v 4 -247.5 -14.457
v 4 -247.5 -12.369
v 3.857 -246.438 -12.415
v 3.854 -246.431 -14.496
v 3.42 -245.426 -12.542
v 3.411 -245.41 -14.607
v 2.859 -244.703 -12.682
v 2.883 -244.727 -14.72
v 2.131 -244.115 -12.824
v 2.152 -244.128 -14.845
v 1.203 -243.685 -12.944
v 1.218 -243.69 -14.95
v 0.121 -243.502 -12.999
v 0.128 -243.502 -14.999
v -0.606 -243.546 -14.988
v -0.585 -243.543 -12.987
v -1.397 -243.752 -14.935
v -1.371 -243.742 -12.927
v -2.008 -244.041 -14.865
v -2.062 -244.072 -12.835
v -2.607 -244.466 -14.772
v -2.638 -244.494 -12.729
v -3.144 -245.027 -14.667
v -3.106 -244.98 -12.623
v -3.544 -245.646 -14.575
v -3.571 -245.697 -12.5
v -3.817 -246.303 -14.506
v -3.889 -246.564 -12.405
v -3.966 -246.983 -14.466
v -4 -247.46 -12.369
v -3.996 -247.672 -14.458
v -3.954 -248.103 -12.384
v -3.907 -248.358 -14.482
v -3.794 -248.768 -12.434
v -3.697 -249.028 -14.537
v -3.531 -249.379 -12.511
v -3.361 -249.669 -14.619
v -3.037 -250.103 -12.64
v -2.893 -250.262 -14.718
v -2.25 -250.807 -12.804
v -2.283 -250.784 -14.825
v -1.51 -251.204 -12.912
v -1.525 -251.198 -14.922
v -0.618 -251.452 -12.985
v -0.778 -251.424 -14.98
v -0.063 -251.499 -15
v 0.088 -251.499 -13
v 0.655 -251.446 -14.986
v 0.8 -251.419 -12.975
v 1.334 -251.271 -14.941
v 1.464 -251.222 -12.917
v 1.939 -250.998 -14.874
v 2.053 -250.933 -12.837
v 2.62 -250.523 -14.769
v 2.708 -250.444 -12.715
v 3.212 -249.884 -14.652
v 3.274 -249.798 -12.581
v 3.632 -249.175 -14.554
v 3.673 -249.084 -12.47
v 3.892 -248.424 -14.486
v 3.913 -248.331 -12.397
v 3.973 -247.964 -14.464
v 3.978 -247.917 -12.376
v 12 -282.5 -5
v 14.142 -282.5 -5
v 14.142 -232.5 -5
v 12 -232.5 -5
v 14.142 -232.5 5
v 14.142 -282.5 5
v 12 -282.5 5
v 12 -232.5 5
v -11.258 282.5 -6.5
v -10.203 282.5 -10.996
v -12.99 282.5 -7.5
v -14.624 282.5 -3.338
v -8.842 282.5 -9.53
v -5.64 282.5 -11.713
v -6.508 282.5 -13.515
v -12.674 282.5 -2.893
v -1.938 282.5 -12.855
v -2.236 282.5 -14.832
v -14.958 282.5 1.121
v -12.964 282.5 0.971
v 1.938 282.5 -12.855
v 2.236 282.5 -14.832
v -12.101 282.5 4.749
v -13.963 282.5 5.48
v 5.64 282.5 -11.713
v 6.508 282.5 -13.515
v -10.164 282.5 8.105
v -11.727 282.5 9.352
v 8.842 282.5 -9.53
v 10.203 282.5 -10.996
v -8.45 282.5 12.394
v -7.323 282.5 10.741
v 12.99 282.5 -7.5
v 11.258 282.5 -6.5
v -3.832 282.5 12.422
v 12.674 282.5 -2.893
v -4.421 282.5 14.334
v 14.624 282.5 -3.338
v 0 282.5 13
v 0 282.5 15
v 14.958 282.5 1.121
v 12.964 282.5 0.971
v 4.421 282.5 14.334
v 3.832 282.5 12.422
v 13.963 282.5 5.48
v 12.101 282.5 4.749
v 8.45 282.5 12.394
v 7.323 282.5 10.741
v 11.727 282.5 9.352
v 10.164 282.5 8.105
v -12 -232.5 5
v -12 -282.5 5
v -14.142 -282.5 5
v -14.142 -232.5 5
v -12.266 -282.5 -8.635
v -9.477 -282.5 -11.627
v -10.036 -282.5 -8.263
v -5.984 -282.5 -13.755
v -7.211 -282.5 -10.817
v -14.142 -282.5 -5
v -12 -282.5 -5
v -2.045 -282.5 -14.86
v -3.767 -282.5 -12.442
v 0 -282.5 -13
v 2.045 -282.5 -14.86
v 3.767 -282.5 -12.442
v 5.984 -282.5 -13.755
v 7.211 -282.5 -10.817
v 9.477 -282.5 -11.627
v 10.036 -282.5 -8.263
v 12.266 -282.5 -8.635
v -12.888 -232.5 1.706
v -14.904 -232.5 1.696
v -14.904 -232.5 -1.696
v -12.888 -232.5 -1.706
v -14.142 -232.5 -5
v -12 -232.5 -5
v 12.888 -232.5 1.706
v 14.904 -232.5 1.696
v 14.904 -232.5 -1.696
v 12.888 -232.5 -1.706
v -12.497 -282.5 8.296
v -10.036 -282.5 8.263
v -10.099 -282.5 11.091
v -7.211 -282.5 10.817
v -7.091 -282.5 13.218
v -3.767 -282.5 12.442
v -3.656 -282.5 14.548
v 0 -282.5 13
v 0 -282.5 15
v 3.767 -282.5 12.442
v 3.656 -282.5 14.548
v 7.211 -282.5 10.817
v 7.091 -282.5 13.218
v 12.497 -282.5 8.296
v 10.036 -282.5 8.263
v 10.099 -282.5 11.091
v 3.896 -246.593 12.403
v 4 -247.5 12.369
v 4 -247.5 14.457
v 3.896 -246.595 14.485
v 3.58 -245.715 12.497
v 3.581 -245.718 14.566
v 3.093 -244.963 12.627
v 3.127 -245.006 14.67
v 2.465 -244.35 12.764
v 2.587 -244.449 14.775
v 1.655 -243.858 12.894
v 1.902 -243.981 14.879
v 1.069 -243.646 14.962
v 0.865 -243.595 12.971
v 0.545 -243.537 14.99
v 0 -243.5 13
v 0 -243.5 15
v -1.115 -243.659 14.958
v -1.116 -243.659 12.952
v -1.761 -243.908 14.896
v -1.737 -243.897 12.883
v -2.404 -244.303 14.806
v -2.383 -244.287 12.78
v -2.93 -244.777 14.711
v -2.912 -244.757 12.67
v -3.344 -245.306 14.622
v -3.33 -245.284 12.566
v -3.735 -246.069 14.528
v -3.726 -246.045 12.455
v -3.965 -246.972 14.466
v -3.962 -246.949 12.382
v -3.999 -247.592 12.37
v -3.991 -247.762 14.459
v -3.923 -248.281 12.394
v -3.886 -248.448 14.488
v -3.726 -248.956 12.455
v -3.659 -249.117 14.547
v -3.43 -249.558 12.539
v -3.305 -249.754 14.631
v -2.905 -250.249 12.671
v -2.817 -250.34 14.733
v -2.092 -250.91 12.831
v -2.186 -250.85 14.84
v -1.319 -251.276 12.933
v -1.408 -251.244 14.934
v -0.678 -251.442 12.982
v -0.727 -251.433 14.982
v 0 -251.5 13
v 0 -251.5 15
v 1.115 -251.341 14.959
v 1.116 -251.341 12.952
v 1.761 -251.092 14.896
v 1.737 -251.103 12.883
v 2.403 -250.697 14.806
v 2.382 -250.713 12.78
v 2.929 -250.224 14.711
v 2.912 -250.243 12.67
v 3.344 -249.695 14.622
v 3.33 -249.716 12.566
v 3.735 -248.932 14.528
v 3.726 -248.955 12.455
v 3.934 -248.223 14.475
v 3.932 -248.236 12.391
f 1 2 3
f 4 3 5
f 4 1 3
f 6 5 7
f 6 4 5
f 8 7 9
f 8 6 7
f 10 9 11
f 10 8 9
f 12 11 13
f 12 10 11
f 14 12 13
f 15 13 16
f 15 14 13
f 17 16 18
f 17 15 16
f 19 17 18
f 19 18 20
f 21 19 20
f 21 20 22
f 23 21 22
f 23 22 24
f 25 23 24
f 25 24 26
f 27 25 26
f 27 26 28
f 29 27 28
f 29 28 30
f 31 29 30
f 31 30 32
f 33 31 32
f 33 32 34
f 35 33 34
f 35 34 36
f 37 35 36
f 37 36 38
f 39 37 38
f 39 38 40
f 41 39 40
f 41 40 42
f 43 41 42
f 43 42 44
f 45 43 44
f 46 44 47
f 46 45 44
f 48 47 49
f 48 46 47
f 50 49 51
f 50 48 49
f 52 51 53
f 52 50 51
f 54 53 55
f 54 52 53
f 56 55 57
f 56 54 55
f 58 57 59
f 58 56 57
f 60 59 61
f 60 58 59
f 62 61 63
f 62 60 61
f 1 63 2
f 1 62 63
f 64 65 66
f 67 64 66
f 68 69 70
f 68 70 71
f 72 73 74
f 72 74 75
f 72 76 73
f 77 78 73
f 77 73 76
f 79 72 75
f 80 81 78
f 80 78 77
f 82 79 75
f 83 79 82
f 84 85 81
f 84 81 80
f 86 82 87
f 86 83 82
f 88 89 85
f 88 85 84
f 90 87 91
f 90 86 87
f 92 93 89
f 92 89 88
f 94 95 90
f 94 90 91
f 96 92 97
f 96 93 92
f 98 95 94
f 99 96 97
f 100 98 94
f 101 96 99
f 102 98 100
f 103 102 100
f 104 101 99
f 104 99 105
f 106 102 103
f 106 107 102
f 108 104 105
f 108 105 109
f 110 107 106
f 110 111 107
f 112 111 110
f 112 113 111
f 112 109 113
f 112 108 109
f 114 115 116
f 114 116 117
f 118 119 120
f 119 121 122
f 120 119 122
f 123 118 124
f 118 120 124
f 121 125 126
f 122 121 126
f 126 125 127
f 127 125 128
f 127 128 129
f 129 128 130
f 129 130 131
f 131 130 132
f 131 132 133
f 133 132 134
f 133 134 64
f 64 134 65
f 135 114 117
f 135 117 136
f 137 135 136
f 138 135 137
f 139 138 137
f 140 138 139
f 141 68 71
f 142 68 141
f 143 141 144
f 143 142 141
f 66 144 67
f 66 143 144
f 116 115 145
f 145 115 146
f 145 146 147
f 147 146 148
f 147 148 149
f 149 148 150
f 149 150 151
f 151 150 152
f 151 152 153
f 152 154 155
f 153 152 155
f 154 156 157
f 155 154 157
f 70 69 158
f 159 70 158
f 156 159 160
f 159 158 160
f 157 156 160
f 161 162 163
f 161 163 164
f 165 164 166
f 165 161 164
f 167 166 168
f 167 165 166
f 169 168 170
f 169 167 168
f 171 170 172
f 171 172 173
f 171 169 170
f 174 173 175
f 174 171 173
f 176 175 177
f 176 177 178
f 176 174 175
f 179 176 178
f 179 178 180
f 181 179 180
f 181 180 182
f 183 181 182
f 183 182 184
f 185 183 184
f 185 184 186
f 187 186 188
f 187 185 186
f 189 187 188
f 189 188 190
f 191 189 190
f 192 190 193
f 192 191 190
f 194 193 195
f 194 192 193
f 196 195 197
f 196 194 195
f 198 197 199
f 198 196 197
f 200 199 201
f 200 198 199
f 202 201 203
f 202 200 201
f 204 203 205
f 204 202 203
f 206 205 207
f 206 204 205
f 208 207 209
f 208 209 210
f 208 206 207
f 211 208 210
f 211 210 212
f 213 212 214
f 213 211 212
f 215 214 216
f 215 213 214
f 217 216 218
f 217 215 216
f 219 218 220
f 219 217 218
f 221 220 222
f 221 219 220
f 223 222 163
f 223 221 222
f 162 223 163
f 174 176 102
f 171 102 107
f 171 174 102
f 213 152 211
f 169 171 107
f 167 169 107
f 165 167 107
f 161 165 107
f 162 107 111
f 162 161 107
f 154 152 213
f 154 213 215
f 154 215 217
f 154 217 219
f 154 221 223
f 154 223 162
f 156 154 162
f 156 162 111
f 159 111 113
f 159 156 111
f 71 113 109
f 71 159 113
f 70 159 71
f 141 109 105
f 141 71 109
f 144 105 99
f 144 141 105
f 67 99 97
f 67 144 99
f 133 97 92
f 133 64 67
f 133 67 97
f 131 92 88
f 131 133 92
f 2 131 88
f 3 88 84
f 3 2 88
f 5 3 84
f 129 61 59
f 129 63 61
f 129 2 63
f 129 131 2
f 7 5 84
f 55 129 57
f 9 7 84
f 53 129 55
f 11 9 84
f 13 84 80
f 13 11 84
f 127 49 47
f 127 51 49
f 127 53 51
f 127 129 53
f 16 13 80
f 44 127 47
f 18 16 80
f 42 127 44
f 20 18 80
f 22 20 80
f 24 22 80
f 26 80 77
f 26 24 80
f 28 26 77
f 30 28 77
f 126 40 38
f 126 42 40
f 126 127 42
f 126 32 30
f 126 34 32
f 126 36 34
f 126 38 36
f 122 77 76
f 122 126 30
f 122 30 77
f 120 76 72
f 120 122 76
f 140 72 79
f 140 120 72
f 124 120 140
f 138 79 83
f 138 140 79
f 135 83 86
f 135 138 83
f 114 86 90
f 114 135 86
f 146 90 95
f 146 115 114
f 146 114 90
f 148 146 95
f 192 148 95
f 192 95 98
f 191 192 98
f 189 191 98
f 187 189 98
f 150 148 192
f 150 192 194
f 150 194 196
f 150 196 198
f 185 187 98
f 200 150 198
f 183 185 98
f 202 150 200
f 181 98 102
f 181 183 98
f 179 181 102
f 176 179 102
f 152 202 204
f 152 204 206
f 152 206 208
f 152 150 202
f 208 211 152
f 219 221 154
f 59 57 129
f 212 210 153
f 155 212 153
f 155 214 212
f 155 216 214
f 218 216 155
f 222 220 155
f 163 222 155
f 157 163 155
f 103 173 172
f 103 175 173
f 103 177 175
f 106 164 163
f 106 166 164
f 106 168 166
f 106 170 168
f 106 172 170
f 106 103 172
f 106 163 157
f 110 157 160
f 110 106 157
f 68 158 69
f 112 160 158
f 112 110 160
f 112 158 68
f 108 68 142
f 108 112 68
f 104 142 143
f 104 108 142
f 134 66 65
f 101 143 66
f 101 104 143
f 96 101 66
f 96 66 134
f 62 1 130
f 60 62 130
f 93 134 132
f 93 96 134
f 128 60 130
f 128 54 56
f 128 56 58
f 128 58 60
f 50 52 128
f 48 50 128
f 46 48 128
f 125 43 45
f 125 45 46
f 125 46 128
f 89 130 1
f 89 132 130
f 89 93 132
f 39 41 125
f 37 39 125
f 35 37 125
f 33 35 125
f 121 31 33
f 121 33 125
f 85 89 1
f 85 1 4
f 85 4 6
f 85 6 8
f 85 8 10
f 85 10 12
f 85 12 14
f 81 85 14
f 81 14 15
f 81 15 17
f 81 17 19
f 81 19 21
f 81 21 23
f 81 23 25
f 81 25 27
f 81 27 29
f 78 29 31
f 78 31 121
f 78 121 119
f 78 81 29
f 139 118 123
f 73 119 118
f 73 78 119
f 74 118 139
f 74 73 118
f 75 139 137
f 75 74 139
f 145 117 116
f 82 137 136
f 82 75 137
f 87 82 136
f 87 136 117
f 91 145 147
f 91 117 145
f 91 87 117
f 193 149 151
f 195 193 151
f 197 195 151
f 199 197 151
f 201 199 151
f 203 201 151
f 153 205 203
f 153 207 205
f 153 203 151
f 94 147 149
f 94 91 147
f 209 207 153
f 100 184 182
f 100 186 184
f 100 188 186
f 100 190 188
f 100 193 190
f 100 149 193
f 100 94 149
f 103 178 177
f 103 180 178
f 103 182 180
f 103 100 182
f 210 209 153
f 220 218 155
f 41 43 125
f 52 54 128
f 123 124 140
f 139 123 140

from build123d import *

# Parameters (mm, degrees)
SKETCH1_R               = 15
SKETCH1_R_2             = 13
BOSS_EXTRUDE1_DEPTH     = 282.5
SKETCH3_W               = 10
SKETCH3_H               = 50
CUT_EXTRUDE1_DEPTH      = 282.5
CUT_EXTRUDE2_DEPTH      = 284.29534059
CUT_EXTRUDE2_DEPTH_BACK = 284.29534059
SKETCH4_R               = 4


with BuildPart() as part:
    # Sketch1 → Boss-Extrude1 (new, symmetric)
    with BuildSketch(Plane(origin=(0, 0, 0), x_dir=(1, 0, 0), z_dir=(0, 1, 0))):
        with Locations(Location((0, 0, 0), (0, 0, 270))):
            Circle(SKETCH1_R)
        with Locations(Location((0, 0, 0), (0, 0, 270))):
            Circle(SKETCH1_R_2, mode=Mode.SUBTRACT)
    extrude(amount=BOSS_EXTRUDE1_DEPTH, both=True)

    # Sketch3 → Cut-Extrude1 (cut, symmetric)
    with BuildSketch(Plane(origin=(0, 0, 0), x_dir=(0, 0, -1), z_dir=(1, 0, 0))):
        with Locations((0, -257.5)):
            Rectangle(SKETCH3_W, SKETCH3_H)
    extrude(amount=CUT_EXTRUDE1_DEPTH, both=True, mode=Mode.SUBTRACT)

    # Sketch4 → Cut-Extrude2 (cut, two sides: drawn at the far end of the back side and taken through both)
    with BuildSketch(Plane.XY.offset(-CUT_EXTRUDE2_DEPTH_BACK)):
        with Locations((0, -247.5)):
            Circle(SKETCH4_R)
    extrude(amount=CUT_EXTRUDE2_DEPTH + CUT_EXTRUDE2_DEPTH_BACK, mode=Mode.SUBTRACT)


solid = part.part
